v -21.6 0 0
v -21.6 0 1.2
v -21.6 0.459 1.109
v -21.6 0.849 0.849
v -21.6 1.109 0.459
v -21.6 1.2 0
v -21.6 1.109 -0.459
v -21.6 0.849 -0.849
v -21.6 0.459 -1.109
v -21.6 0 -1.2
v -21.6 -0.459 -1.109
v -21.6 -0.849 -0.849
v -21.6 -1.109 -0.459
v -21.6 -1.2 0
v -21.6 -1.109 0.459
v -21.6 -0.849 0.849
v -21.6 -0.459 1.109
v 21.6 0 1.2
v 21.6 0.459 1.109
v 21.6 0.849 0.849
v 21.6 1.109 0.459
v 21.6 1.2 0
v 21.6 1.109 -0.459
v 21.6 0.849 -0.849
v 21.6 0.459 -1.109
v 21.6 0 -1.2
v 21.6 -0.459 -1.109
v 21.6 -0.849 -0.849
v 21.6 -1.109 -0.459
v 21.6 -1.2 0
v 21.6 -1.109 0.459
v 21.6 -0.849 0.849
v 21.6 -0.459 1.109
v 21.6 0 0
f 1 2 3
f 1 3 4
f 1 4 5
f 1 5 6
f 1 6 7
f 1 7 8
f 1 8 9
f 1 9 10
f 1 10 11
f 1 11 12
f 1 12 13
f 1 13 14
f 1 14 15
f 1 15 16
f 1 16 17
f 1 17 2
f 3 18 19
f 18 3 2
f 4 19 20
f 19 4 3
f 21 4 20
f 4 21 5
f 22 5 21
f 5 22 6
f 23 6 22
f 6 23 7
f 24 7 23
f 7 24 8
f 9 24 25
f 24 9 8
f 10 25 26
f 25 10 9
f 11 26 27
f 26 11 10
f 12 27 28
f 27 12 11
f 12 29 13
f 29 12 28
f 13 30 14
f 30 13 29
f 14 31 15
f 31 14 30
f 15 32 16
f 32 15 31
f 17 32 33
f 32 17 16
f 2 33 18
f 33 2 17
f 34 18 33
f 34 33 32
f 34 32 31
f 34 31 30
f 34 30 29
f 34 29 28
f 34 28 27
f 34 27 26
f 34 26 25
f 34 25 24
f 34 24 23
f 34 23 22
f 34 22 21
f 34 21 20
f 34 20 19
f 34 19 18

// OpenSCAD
// file: ../p/4-4edge.scad
use <../lib.scad>
function ldraw_lib__4_4edge() = [
// 0 Circle 1.0
// 0 Name: 4-4edge.dat
// 0 Author: James Jessiman
// 0 !LDRAW_ORG Primitive UPDATE 2017-01
// 0 !LICENSE Licensed under CC BY 2.0 and CC BY 4.0 : see CAreadme.txt
// 
// 0 BFC CERTIFY CCW
  [0,"BFC","CERTIFY"],
  [0,"BFC","CCW"],
// 
// 0 !HISTORY 1998-12-15 [PTadmin] Official Update 1998-10
// 0 !HISTORY 2005-12-28 [PTadmin] Official Update 2005-01
// 0 !HISTORY 2007-06-24 [PTadmin] Header formatted for Contributor Agreement
// 0 !HISTORY 2008-07-01 [PTadmin] Official Update 2008-01
// 0 !HISTORY 2017-01-15 [Steffen] BFCed
// 0 !HISTORY 2017-12-30 [PTadmin] Official Update 2017-01
// 
// 
// 2 24 1 0 0 0.9239 0 0.3827
  [2,24,1,0,0,0.9239,0,0.3827],
// 2 24 0.9239 0 0.3827 0.7071 0 0.7071
  [2,24,0.9239,0,0.3827,0.7071,0,0.7071],
// 2 24 0.7071 0 0.7071 0.3827 0 0.9239
  [2,24,0.7071,0,0.7071,0.3827,0,0.9239],
// 2 24 0.3827 0 0.9239 0 0 1
  [2,24,0.3827,0,0.9239,0,0,1],
// 2 24 0 0 1 -0.3827 0 0.9239
  [2,24,0,0,1,-0.3827,0,0.9239],
// 2 24 -0.3827 0 0.9239 -0.7071 0 0.7071
  [2,24,-0.3827,0,0.9239,-0.7071,0,0.7071],
// 2 24 -0.7071 0 0.7071 -0.9239 0 0.3827
  [2,24,-0.7071,0,0.7071,-0.9239,0,0.3827],
// 2 24 -0.9239 0 0.3827 -1 0 -0
  [2,24,-0.9239,0,0.3827,-1,0,-0],
// 2 24 -1 0 -0 -0.9239 0 -0.3827
  [2,24,-1,0,-0,-0.9239,0,-0.3827],
// 2 24 -0.9239 0 -0.3827 -0.7071 0 -0.7071
  [2,24,-0.9239,0,-0.3827,-0.7071,0,-0.7071],
// 2 24 -0.7071 0 -0.7071 -0.3827 0 -0.9239
  [2,24,-0.7071,0,-0.7071,-0.3827,0,-0.9239],
// 2 24 -0.3827 0 -0.9239 0 0 -1
  [2,24,-0.3827,0,-0.9239,0,0,-1],
// 2 24 0 0 -1 0.3827 0 -0.9239
  [2,24,0,0,-1,0.3827,0,-0.9239],
// 2 24 0.3827 0 -0.9239 0.7071 0 -0.7071
  [2,24,0.3827,0,-0.9239,0.7071,0,-0.7071],
// 2 24 0.7071 0 -0.7071 0.9239 0 -0.3827
  [2,24,0.7071,0,-0.7071,0.9239,0,-0.3827],
// 2 24 0.9239 0 -0.3827 1 0 0
  [2,24,0.9239,0,-0.3827,1,0,0],
];
module ldraw_lib__4_4edge(step=0, col=false, unit=2/5, alt=false, line=0.2, solid=!$preview)
    makepoly(ldraw_lib__4_4edge(), step=step, col=col, unit=unit, alt=alt, line=line, solid=solid);
ldraw_lib__4_4edge(line=0.2);
// file: ../p/4-4cyli.scad
use <../lib.scad>
function ldraw_lib__4_4cyli() = [
// 0 Cylinder 1.0
// 0 Name: 4-4cyli.dat
// 0 Author: James Jessiman
// 0 !LDRAW_ORG Primitive UPDATE 2005-01
// 0 !LICENSE Licensed under CC BY 2.0 and CC BY 4.0 : see CAreadme.txt
// 
// 0 BFC CERTIFY CCW
  [0,"BFC","CERTIFY"],
  [0,"BFC","CCW"],
// 
// 0 !HISTORY 1998-12-15 [PTadmin] Official Update 1998-10
// 0 !HISTORY 2002-03-23 [sbliss] Added BFC statement; merged headers from files in distributions LDraw 0.27 and Complete.
// 0 !HISTORY 2002-04-25 [PTadmin] Official Update 2002-02
// 0 !HISTORY 2004-12-14 [guyvivan] BFC CCW
// 0 !HISTORY 2005-12-28 [PTadmin] Official Update 2005-01
// 0 !HISTORY 2007-06-24 [PTadmin] Header formatted for Contributor Agreement
// 0 !HISTORY 2008-07-01 [PTadmin] Official Update 2008-01
// 
// 
// 4 16 1 1 0 0.9239 1 0.3827 0.9239 0 0.3827 1 0 0
  [4,16,1,1,0,0.9239,1,0.3827,0.9239,0,0.3827,1,0,0],
// 5 24 1 0 0 1 1 0 0.9239 0 0.3827 0.9239 0 -0.3827
  [5,24,1,0,0,1,1,0,0.9239,0,0.3827,0.9239,0,-0.3827],
// 4 16 0.9239 1 0.3827 0.7071 1 0.7071 0.7071 0 0.7071 0.9239 0 0.3827
  [4,16,0.9239,1,0.3827,0.7071,1,0.7071,0.7071,0,0.7071,0.9239,0,0.3827],
// 5 24 0.9239 0 0.3827 0.9239 1 0.3827 0.7071 0 0.7071 1 0 0
  [5,24,0.9239,0,0.3827,0.9239,1,0.3827,0.7071,0,0.7071,1,0,0],
// 4 16 0.7071 1 0.7071 0.3827 1 0.9239 0.3827 0 0.9239 0.7071 0 0.7071
  [4,16,0.7071,1,0.7071,0.3827,1,0.9239,0.3827,0,0.9239,0.7071,0,0.7071],
// 5 24 0.7071 0 0.7071 0.7071 1 0.7071 0.3827 0 0.9239 0.9239 0 0.3827
  [5,24,0.7071,0,0.7071,0.7071,1,0.7071,0.3827,0,0.9239,0.9239,0,0.3827],
// 4 16 0.3827 1 0.9239 0 1 1 0 0 1 0.3827 0 0.9239
  [4,16,0.3827,1,0.9239,0,1,1,0,0,1,0.3827,0,0.9239],
// 5 24 0.3827 0 0.9239 0.3827 1 0.9239 0 0 1 0.7071 0 0.7071
  [5,24,0.3827,0,0.9239,0.3827,1,0.9239,0,0,1,0.7071,0,0.7071],
// 4 16 0 1 1 -0.3827 1 0.9239 -0.3827 0 0.9239 0 0 1
  [4,16,0,1,1,-0.3827,1,0.9239,-0.3827,0,0.9239,0,0,1],
// 5 24 0 0 1 0 1 1 -0.3827 0 0.9239 0.3827 0 0.9239
  [5,24,0,0,1,0,1,1,-0.3827,0,0.9239,0.3827,0,0.9239],
// 4 16 -0.3827 1 0.9239 -0.7071 1 0.7071 -0.7071 0 0.7071 -0.3827 0 0.9239
  [4,16,-0.3827,1,0.9239,-0.7071,1,0.7071,-0.7071,0,0.7071,-0.3827,0,0.9239],
// 5 24 -0.3827 0 0.9239 -0.3827 1 0.9239 -0.7071 0 0.7071 0 0 1
  [5,24,-0.3827,0,0.9239,-0.3827,1,0.9239,-0.7071,0,0.7071,0,0,1],
// 4 16 -0.7071 1 0.7071 -0.9239 1 0.3827 -0.9239 0 0.3827 -0.7071 0 0.7071
  [4,16,-0.7071,1,0.7071,-0.9239,1,0.3827,-0.9239,0,0.3827,-0.7071,0,0.7071],
// 5 24 -0.7071 0 0.7071 -0.7071 1 0.7071 -0.9239 0 0.3827 -0.3827 0 0.9239
  [5,24,-0.7071,0,0.7071,-0.7071,1,0.7071,-0.9239,0,0.3827,-0.3827,0,0.9239],
// 4 16 -0.9239 1 0.3827 -1 1 0 -1 0 0 -0.9239 0 0.3827
  [4,16,-0.9239,1,0.3827,-1,1,0,-1,0,0,-0.9239,0,0.3827],
// 5 24 -0.9239 0 0.3827 -0.9239 1 0.3827 -1 0 0 -0.7071 0 0.7071
  [5,24,-0.9239,0,0.3827,-0.9239,1,0.3827,-1,0,0,-0.7071,0,0.7071],
// 4 16 -1 1 0 -0.9239 1 -0.3827 -0.9239 0 -0.3827 -1 0 0
  [4,16,-1,1,0,-0.9239,1,-0.3827,-0.9239,0,-0.3827,-1,0,0],
// 5 24 -1 0 0 -1 1 0 -0.9239 0 -0.3827 -0.9239 0 0.3827
  [5,24,-1,0,0,-1,1,0,-0.9239,0,-0.3827,-0.9239,0,0.3827],
// 4 16 -0.9239 1 -0.3827 -0.7071 1 -0.7071 -0.7071 0 -0.7071 -0.9239 0 -0.3827
  [4,16,-0.9239,1,-0.3827,-0.7071,1,-0.7071,-0.7071,0,-0.7071,-0.9239,0,-0.3827],
// 5 24 -0.9239 0 -0.3827 -0.9239 1 -0.3827 -0.7071 0 -0.7071 -1 0 0
  [5,24,-0.9239,0,-0.3827,-0.9239,1,-0.3827,-0.7071,0,-0.7071,-1,0,0],
// 4 16 -0.7071 1 -0.7071 -0.3827 1 -0.9239 -0.3827 0 -0.9239 -0.7071 0 -0.7071
  [4,16,-0.7071,1,-0.7071,-0.3827,1,-0.9239,-0.3827,0,-0.9239,-0.7071,0,-0.7071],
// 5 24 -0.7071 0 -0.7071 -0.7071 1 -0.7071 -0.3827 0 -0.9239 -0.9239 0 -0.3827
  [5,24,-0.7071,0,-0.7071,-0.7071,1,-0.7071,-0.3827,0,-0.9239,-0.9239,0,-0.3827],
// 4 16 -0.3827 1 -0.9239 0 1 -1 0 0 -1 -0.3827 0 -0.9239
  [4,16,-0.3827,1,-0.9239,0,1,-1,0,0,-1,-0.3827,0,-0.9239],
// 5 24 -0.3827 0 -0.9239 -0.3827 1 -0.9239 0 0 -1 -0.7071 0 -0.7071
  [5,24,-0.3827,0,-0.9239,-0.3827,1,-0.9239,0,0,-1,-0.7071,0,-0.7071],
// 4 16 0 1 -1 0.3827 1 -0.9239 0.3827 0 -0.9239 0 0 -1
  [4,16,0,1,-1,0.3827,1,-0.9239,0.3827,0,-0.9239,0,0,-1],
// 5 24 0 0 -1 0 1 -1 0.3827 0 -0.9239 -0.3827 0 -0.9239
  [5,24,0,0,-1,0,1,-1,0.3827,0,-0.9239,-0.3827,0,-0.9239],
// 4 16 0.3827 1 -0.9239 0.7071 1 -0.7071 0.7071 0 -0.7071 0.3827 0 -0.9239
  [4,16,0.3827,1,-0.9239,0.7071,1,-0.7071,0.7071,0,-0.7071,0.3827,0,-0.9239],
// 5 24 0.3827 0 -0.9239 0.3827 1 -0.9239 0.7071 0 -0.7071 0 0 -1
  [5,24,0.3827,0,-0.9239,0.3827,1,-0.9239,0.7071,0,-0.7071,0,0,-1],
// 4 16 0.7071 1 -0.7071 0.9239 1 -0.3827 0.9239 0 -0.3827 0.7071 0 -0.7071
  [4,16,0.7071,1,-0.7071,0.9239,1,-0.3827,0.9239,0,-0.3827,0.7071,0,-0.7071],
// 5 24 0.7071 0 -0.7071 0.7071 1 -0.7071 0.9239 0 -0.3827 0.3827 0 -0.9239
  [5,24,0.7071,0,-0.7071,0.7071,1,-0.7071,0.9239,0,-0.3827,0.3827,0,-0.9239],
// 4 16 0.9239 1 -0.3827 1 1 0 1 0 0 0.9239 0 -0.3827
  [4,16,0.9239,1,-0.3827,1,1,0,1,0,0,0.9239,0,-0.3827],
// 5 24 0.9239 0 -0.3827 0.9239 1 -0.3827 1 0 0 0.7071 0 -0.7071
  [5,24,0.9239,0,-0.3827,0.9239,1,-0.3827,1,0,0,0.7071,0,-0.7071],
// 0
];
module ldraw_lib__4_4cyli(step=0, col=false, unit=2/5, alt=false, line=0.2, solid=!$preview)
    makepoly(ldraw_lib__4_4cyli(), step=step, col=col, unit=unit, alt=alt, line=line, solid=solid);
ldraw_lib__4_4cyli(line=0.2);
// file: ../p/4-4disc.scad
use <../lib.scad>
function ldraw_lib__4_4disc() = [
// 0 Disc 1.0
// 0 Name: 4-4disc.dat
// 0 Author: James Jessiman
// 0 !LDRAW_ORG Primitive UPDATE 2002-02
// 0 !LICENSE Licensed under CC BY 2.0 and CC BY 4.0 : see CAreadme.txt
// 
// 0 BFC CERTIFY CCW
  [0,"BFC","CERTIFY"],
  [0,"BFC","CCW"],
// 
// 0 !HISTORY 1998-12-15 [PTadmin] Official Update 1998-10
// 0 !HISTORY 2002-03-23 [sbliss] Added BFC statement
// 0 !HISTORY 2002-04-25 [PTadmin] Official Update 2002-02
// 0 !HISTORY 2007-06-24 [PTadmin] Header formatted for Contributor Agreement
// 0 !HISTORY 2008-07-01 [PTadmin] Official Update 2008-01
// 
// 
// 3 16 0 0 0 1 0 0 0.9239 0 0.3827
  [3,16,0,0,0,1,0,0,0.9239,0,0.3827],
// 3 16 0 0 0 0.9239 0 0.3827 0.7071 0 0.7071
  [3,16,0,0,0,0.9239,0,0.3827,0.7071,0,0.7071],
// 3 16 0 0 0 0.7071 0 0.7071 0.3827 0 0.9239
  [3,16,0,0,0,0.7071,0,0.7071,0.3827,0,0.9239],
// 3 16 0 0 0 0.3827 0 0.9239 0 0 1
  [3,16,0,0,0,0.3827,0,0.9239,0,0,1],
// 3 16 0 0 0 0 0 1 -0.3827 0 0.9239
  [3,16,0,0,0,0,0,1,-0.3827,0,0.9239],
// 3 16 0 0 0 -0.3827 0 0.9239 -0.7071 0 0.7071
  [3,16,0,0,0,-0.3827,0,0.9239,-0.7071,0,0.7071],
// 3 16 0 0 0 -0.7071 0 0.7071 -0.9239 0 0.3827
  [3,16,0,0,0,-0.7071,0,0.7071,-0.9239,0,0.3827],
// 3 16 0 0 0 -0.9239 0 0.3827 -1 0 -0
  [3,16,0,0,0,-0.9239,0,0.3827,-1,0,-0],
// 3 16 0 0 0 -1 0 -0 -0.9239 0 -0.3827
  [3,16,0,0,0,-1,0,-0,-0.9239,0,-0.3827],
// 3 16 0 0 0 -0.9239 0 -0.3827 -0.7071 0 -0.7071
  [3,16,0,0,0,-0.9239,0,-0.3827,-0.7071,0,-0.7071],
// 3 16 0 0 0 -0.7071 0 -0.7071 -0.3827 0 -0.9239
  [3,16,0,0,0,-0.7071,0,-0.7071,-0.3827,0,-0.9239],
// 3 16 0 0 0 -0.3827 0 -0.9239 0 0 -1
  [3,16,0,0,0,-0.3827,0,-0.9239,0,0,-1],
// 3 16 0 0 0 0 0 -1 0.3827 0 -0.9239
  [3,16,0,0,0,0,0,-1,0.3827,0,-0.9239],
// 3 16 0 0 0 0.3827 0 -0.9239 0.7071 0 -0.7071
  [3,16,0,0,0,0.3827,0,-0.9239,0.7071,0,-0.7071],
// 3 16 0 0 0 0.7071 0 -0.7071 0.9239 0 -0.3827
  [3,16,0,0,0,0.7071,0,-0.7071,0.9239,0,-0.3827],
// 3 16 0 0 0 0.9239 0 -0.3827 1 0 0
  [3,16,0,0,0,0.9239,0,-0.3827,1,0,0],
// 0
];
module ldraw_lib__4_4disc(step=0, col=false, unit=2/5, alt=false, line=0.2, solid=!$preview)
    makepoly(ldraw_lib__4_4disc(), step=step, col=col, unit=unit, alt=alt, line=line, solid=solid);
ldraw_lib__4_4disc(line=0.2);
// file: ../p/4-4cylc.scad
use <../lib.scad>
use <4-4cyli.scad>
use <4-4disc.scad>
use <4-4edge.scad>
function ldraw_lib__4_4cylc() = [
// 0 Cylinder Closed 1.0
// 0 Name: 4-4cylc.dat
// 0 Author: Alex Taylor [anathema]
// 0 !LDRAW_ORG Primitive UPDATE 2009-02
// 0 !LICENSE Licensed under CC BY 2.0 and CC BY 4.0 : see CAreadme.txt
// 
// 0 BFC CERTIFY CCW
  [0,"BFC","CERTIFY"],
  [0,"BFC","CCW"],
// 
// 0 !HISTORY 2008-12-29 [cwdee] Removed one disc
// 0 !HISTORY 2009-09-03 [PTadmin] Official Update 2009-02
// 
// 
// 1 16 0 0 0 1 0 0 0 1 0 0 0 1 4-4edge.dat
  [1,16,0,0,0,1,0,0,0,1,0,0,0,1, ldraw_lib__4_4edge()],
// 1 16 0 1 0 1 0 0 0 1 0 0 0 1 4-4edge.dat
  [1,16,0,1,0,1,0,0,0,1,0,0,0,1, ldraw_lib__4_4edge()],
// 1 16 0 0 0 1 0 0 0 1 0 0 0 1 4-4disc.dat
  [1,16,0,0,0,1,0,0,0,1,0,0,0,1, ldraw_lib__4_4disc()],
// 1 16 0 0 0 1 0 0 0 1 0 0 0 1 4-4cyli.dat
  [1,16,0,0,0,1,0,0,0,1,0,0,0,1, ldraw_lib__4_4cyli()],
// 0
];
module ldraw_lib__4_4cylc(step=0, col=false, unit=2/5, alt=false, line=0.2, solid=!$preview)
    makepoly(ldraw_lib__4_4cylc(), step=step, col=col, unit=unit, alt=alt, line=line, solid=solid);
ldraw_lib__4_4cylc(line=0.2);
// file: 70081.scad
use <../lib.scad>
use <../p/4-4cylc.scad>
use <../p/4-4disc.scad>
function ldraw_lib__70081() = [
// 0 ~Axle Steel  6 x 108
// 0 Name: 70081.dat
// 0 Author: Alex Taylor [anathema]
// 0 !LDRAW_ORG Part UPDATE 2012-03
// 0 !LICENSE Licensed under CC BY 2.0 and CC BY 4.0 : see CAreadme.txt
// 
// 0 BFC CERTIFY CCW
  [0,"BFC","CERTIFY"],
  [0,"BFC","CCW"],
// 
// 0 !CATEGORY Wheel
// 0 !KEYWORDS Fabuland
// 
// 0 !HISTORY 2012-08-09 [PTadmin] Official Update 2012-02
// 0 !HISTORY 2012-11-04 [PTadmin] Renamed from u9162
// 0 !HISTORY 2012-12-28 [PTadmin] Official Update 2012-03
// 
// 
// 1 16 -54 0 0 0 108 0 -3 0 0 0 0 3 4-4cylc.dat
  [1,16,-54,0,0,0,108,0,-3,0,0,0,0,3, ldraw_lib__4_4cylc()],
// 1 16 54 0 0 0 -1 0 -3 0 0 0 0 -3 4-4disc.dat
  [1,16,54,0,0,0,-1,0,-3,0,0,0,0,-3, ldraw_lib__4_4disc()],
];
module ldraw_lib__70081(step=0, col=false, unit=2/5, alt=false, line=0.2, solid=!$preview)
    makepoly(ldraw_lib__70081(), step=step, col=col, unit=unit, alt=alt, line=line, solid=solid);
ldraw_lib__70081(line=0.2);
// main file
use <../lib.scad>
use <70081.scad>
function ldraw_lib__u9162() = [
// 0 ~Moved to 70081
// 0 Name: u9162.dat
// 0 Author: [PTadmin]
// 0 !LDRAW_ORG Part UPDATE 2012-03
// 0 !LICENSE Licensed under CC BY 4.0 : see CAreadme.txt
// 
// 0 BFC CERTIFY CCW
  [0,"BFC","CERTIFY"],
  [0,"BFC","CCW"],
// 
// 0 !HISTORY 2012-12-28 [PTadmin] Official Update 2012-03
// 
// 
// 0 // ~Axle Steel 6 x 108
// 1 16 0 0 0 1 0 0 0 1 0 0 0 1 70081.dat
  [1,16,0,0,0,1,0,0,0,1,0,0,0,1, ldraw_lib__70081()],
];
module ldraw_lib__u9162(step=0, col=false, unit=2/5, alt=false, line=0.2, solid=!$preview)
    makepoly(ldraw_lib__u9162(), step=step, col=col, unit=unit, alt=alt, line=line, solid=solid);
ldraw_lib__u9162(line=0.2);
